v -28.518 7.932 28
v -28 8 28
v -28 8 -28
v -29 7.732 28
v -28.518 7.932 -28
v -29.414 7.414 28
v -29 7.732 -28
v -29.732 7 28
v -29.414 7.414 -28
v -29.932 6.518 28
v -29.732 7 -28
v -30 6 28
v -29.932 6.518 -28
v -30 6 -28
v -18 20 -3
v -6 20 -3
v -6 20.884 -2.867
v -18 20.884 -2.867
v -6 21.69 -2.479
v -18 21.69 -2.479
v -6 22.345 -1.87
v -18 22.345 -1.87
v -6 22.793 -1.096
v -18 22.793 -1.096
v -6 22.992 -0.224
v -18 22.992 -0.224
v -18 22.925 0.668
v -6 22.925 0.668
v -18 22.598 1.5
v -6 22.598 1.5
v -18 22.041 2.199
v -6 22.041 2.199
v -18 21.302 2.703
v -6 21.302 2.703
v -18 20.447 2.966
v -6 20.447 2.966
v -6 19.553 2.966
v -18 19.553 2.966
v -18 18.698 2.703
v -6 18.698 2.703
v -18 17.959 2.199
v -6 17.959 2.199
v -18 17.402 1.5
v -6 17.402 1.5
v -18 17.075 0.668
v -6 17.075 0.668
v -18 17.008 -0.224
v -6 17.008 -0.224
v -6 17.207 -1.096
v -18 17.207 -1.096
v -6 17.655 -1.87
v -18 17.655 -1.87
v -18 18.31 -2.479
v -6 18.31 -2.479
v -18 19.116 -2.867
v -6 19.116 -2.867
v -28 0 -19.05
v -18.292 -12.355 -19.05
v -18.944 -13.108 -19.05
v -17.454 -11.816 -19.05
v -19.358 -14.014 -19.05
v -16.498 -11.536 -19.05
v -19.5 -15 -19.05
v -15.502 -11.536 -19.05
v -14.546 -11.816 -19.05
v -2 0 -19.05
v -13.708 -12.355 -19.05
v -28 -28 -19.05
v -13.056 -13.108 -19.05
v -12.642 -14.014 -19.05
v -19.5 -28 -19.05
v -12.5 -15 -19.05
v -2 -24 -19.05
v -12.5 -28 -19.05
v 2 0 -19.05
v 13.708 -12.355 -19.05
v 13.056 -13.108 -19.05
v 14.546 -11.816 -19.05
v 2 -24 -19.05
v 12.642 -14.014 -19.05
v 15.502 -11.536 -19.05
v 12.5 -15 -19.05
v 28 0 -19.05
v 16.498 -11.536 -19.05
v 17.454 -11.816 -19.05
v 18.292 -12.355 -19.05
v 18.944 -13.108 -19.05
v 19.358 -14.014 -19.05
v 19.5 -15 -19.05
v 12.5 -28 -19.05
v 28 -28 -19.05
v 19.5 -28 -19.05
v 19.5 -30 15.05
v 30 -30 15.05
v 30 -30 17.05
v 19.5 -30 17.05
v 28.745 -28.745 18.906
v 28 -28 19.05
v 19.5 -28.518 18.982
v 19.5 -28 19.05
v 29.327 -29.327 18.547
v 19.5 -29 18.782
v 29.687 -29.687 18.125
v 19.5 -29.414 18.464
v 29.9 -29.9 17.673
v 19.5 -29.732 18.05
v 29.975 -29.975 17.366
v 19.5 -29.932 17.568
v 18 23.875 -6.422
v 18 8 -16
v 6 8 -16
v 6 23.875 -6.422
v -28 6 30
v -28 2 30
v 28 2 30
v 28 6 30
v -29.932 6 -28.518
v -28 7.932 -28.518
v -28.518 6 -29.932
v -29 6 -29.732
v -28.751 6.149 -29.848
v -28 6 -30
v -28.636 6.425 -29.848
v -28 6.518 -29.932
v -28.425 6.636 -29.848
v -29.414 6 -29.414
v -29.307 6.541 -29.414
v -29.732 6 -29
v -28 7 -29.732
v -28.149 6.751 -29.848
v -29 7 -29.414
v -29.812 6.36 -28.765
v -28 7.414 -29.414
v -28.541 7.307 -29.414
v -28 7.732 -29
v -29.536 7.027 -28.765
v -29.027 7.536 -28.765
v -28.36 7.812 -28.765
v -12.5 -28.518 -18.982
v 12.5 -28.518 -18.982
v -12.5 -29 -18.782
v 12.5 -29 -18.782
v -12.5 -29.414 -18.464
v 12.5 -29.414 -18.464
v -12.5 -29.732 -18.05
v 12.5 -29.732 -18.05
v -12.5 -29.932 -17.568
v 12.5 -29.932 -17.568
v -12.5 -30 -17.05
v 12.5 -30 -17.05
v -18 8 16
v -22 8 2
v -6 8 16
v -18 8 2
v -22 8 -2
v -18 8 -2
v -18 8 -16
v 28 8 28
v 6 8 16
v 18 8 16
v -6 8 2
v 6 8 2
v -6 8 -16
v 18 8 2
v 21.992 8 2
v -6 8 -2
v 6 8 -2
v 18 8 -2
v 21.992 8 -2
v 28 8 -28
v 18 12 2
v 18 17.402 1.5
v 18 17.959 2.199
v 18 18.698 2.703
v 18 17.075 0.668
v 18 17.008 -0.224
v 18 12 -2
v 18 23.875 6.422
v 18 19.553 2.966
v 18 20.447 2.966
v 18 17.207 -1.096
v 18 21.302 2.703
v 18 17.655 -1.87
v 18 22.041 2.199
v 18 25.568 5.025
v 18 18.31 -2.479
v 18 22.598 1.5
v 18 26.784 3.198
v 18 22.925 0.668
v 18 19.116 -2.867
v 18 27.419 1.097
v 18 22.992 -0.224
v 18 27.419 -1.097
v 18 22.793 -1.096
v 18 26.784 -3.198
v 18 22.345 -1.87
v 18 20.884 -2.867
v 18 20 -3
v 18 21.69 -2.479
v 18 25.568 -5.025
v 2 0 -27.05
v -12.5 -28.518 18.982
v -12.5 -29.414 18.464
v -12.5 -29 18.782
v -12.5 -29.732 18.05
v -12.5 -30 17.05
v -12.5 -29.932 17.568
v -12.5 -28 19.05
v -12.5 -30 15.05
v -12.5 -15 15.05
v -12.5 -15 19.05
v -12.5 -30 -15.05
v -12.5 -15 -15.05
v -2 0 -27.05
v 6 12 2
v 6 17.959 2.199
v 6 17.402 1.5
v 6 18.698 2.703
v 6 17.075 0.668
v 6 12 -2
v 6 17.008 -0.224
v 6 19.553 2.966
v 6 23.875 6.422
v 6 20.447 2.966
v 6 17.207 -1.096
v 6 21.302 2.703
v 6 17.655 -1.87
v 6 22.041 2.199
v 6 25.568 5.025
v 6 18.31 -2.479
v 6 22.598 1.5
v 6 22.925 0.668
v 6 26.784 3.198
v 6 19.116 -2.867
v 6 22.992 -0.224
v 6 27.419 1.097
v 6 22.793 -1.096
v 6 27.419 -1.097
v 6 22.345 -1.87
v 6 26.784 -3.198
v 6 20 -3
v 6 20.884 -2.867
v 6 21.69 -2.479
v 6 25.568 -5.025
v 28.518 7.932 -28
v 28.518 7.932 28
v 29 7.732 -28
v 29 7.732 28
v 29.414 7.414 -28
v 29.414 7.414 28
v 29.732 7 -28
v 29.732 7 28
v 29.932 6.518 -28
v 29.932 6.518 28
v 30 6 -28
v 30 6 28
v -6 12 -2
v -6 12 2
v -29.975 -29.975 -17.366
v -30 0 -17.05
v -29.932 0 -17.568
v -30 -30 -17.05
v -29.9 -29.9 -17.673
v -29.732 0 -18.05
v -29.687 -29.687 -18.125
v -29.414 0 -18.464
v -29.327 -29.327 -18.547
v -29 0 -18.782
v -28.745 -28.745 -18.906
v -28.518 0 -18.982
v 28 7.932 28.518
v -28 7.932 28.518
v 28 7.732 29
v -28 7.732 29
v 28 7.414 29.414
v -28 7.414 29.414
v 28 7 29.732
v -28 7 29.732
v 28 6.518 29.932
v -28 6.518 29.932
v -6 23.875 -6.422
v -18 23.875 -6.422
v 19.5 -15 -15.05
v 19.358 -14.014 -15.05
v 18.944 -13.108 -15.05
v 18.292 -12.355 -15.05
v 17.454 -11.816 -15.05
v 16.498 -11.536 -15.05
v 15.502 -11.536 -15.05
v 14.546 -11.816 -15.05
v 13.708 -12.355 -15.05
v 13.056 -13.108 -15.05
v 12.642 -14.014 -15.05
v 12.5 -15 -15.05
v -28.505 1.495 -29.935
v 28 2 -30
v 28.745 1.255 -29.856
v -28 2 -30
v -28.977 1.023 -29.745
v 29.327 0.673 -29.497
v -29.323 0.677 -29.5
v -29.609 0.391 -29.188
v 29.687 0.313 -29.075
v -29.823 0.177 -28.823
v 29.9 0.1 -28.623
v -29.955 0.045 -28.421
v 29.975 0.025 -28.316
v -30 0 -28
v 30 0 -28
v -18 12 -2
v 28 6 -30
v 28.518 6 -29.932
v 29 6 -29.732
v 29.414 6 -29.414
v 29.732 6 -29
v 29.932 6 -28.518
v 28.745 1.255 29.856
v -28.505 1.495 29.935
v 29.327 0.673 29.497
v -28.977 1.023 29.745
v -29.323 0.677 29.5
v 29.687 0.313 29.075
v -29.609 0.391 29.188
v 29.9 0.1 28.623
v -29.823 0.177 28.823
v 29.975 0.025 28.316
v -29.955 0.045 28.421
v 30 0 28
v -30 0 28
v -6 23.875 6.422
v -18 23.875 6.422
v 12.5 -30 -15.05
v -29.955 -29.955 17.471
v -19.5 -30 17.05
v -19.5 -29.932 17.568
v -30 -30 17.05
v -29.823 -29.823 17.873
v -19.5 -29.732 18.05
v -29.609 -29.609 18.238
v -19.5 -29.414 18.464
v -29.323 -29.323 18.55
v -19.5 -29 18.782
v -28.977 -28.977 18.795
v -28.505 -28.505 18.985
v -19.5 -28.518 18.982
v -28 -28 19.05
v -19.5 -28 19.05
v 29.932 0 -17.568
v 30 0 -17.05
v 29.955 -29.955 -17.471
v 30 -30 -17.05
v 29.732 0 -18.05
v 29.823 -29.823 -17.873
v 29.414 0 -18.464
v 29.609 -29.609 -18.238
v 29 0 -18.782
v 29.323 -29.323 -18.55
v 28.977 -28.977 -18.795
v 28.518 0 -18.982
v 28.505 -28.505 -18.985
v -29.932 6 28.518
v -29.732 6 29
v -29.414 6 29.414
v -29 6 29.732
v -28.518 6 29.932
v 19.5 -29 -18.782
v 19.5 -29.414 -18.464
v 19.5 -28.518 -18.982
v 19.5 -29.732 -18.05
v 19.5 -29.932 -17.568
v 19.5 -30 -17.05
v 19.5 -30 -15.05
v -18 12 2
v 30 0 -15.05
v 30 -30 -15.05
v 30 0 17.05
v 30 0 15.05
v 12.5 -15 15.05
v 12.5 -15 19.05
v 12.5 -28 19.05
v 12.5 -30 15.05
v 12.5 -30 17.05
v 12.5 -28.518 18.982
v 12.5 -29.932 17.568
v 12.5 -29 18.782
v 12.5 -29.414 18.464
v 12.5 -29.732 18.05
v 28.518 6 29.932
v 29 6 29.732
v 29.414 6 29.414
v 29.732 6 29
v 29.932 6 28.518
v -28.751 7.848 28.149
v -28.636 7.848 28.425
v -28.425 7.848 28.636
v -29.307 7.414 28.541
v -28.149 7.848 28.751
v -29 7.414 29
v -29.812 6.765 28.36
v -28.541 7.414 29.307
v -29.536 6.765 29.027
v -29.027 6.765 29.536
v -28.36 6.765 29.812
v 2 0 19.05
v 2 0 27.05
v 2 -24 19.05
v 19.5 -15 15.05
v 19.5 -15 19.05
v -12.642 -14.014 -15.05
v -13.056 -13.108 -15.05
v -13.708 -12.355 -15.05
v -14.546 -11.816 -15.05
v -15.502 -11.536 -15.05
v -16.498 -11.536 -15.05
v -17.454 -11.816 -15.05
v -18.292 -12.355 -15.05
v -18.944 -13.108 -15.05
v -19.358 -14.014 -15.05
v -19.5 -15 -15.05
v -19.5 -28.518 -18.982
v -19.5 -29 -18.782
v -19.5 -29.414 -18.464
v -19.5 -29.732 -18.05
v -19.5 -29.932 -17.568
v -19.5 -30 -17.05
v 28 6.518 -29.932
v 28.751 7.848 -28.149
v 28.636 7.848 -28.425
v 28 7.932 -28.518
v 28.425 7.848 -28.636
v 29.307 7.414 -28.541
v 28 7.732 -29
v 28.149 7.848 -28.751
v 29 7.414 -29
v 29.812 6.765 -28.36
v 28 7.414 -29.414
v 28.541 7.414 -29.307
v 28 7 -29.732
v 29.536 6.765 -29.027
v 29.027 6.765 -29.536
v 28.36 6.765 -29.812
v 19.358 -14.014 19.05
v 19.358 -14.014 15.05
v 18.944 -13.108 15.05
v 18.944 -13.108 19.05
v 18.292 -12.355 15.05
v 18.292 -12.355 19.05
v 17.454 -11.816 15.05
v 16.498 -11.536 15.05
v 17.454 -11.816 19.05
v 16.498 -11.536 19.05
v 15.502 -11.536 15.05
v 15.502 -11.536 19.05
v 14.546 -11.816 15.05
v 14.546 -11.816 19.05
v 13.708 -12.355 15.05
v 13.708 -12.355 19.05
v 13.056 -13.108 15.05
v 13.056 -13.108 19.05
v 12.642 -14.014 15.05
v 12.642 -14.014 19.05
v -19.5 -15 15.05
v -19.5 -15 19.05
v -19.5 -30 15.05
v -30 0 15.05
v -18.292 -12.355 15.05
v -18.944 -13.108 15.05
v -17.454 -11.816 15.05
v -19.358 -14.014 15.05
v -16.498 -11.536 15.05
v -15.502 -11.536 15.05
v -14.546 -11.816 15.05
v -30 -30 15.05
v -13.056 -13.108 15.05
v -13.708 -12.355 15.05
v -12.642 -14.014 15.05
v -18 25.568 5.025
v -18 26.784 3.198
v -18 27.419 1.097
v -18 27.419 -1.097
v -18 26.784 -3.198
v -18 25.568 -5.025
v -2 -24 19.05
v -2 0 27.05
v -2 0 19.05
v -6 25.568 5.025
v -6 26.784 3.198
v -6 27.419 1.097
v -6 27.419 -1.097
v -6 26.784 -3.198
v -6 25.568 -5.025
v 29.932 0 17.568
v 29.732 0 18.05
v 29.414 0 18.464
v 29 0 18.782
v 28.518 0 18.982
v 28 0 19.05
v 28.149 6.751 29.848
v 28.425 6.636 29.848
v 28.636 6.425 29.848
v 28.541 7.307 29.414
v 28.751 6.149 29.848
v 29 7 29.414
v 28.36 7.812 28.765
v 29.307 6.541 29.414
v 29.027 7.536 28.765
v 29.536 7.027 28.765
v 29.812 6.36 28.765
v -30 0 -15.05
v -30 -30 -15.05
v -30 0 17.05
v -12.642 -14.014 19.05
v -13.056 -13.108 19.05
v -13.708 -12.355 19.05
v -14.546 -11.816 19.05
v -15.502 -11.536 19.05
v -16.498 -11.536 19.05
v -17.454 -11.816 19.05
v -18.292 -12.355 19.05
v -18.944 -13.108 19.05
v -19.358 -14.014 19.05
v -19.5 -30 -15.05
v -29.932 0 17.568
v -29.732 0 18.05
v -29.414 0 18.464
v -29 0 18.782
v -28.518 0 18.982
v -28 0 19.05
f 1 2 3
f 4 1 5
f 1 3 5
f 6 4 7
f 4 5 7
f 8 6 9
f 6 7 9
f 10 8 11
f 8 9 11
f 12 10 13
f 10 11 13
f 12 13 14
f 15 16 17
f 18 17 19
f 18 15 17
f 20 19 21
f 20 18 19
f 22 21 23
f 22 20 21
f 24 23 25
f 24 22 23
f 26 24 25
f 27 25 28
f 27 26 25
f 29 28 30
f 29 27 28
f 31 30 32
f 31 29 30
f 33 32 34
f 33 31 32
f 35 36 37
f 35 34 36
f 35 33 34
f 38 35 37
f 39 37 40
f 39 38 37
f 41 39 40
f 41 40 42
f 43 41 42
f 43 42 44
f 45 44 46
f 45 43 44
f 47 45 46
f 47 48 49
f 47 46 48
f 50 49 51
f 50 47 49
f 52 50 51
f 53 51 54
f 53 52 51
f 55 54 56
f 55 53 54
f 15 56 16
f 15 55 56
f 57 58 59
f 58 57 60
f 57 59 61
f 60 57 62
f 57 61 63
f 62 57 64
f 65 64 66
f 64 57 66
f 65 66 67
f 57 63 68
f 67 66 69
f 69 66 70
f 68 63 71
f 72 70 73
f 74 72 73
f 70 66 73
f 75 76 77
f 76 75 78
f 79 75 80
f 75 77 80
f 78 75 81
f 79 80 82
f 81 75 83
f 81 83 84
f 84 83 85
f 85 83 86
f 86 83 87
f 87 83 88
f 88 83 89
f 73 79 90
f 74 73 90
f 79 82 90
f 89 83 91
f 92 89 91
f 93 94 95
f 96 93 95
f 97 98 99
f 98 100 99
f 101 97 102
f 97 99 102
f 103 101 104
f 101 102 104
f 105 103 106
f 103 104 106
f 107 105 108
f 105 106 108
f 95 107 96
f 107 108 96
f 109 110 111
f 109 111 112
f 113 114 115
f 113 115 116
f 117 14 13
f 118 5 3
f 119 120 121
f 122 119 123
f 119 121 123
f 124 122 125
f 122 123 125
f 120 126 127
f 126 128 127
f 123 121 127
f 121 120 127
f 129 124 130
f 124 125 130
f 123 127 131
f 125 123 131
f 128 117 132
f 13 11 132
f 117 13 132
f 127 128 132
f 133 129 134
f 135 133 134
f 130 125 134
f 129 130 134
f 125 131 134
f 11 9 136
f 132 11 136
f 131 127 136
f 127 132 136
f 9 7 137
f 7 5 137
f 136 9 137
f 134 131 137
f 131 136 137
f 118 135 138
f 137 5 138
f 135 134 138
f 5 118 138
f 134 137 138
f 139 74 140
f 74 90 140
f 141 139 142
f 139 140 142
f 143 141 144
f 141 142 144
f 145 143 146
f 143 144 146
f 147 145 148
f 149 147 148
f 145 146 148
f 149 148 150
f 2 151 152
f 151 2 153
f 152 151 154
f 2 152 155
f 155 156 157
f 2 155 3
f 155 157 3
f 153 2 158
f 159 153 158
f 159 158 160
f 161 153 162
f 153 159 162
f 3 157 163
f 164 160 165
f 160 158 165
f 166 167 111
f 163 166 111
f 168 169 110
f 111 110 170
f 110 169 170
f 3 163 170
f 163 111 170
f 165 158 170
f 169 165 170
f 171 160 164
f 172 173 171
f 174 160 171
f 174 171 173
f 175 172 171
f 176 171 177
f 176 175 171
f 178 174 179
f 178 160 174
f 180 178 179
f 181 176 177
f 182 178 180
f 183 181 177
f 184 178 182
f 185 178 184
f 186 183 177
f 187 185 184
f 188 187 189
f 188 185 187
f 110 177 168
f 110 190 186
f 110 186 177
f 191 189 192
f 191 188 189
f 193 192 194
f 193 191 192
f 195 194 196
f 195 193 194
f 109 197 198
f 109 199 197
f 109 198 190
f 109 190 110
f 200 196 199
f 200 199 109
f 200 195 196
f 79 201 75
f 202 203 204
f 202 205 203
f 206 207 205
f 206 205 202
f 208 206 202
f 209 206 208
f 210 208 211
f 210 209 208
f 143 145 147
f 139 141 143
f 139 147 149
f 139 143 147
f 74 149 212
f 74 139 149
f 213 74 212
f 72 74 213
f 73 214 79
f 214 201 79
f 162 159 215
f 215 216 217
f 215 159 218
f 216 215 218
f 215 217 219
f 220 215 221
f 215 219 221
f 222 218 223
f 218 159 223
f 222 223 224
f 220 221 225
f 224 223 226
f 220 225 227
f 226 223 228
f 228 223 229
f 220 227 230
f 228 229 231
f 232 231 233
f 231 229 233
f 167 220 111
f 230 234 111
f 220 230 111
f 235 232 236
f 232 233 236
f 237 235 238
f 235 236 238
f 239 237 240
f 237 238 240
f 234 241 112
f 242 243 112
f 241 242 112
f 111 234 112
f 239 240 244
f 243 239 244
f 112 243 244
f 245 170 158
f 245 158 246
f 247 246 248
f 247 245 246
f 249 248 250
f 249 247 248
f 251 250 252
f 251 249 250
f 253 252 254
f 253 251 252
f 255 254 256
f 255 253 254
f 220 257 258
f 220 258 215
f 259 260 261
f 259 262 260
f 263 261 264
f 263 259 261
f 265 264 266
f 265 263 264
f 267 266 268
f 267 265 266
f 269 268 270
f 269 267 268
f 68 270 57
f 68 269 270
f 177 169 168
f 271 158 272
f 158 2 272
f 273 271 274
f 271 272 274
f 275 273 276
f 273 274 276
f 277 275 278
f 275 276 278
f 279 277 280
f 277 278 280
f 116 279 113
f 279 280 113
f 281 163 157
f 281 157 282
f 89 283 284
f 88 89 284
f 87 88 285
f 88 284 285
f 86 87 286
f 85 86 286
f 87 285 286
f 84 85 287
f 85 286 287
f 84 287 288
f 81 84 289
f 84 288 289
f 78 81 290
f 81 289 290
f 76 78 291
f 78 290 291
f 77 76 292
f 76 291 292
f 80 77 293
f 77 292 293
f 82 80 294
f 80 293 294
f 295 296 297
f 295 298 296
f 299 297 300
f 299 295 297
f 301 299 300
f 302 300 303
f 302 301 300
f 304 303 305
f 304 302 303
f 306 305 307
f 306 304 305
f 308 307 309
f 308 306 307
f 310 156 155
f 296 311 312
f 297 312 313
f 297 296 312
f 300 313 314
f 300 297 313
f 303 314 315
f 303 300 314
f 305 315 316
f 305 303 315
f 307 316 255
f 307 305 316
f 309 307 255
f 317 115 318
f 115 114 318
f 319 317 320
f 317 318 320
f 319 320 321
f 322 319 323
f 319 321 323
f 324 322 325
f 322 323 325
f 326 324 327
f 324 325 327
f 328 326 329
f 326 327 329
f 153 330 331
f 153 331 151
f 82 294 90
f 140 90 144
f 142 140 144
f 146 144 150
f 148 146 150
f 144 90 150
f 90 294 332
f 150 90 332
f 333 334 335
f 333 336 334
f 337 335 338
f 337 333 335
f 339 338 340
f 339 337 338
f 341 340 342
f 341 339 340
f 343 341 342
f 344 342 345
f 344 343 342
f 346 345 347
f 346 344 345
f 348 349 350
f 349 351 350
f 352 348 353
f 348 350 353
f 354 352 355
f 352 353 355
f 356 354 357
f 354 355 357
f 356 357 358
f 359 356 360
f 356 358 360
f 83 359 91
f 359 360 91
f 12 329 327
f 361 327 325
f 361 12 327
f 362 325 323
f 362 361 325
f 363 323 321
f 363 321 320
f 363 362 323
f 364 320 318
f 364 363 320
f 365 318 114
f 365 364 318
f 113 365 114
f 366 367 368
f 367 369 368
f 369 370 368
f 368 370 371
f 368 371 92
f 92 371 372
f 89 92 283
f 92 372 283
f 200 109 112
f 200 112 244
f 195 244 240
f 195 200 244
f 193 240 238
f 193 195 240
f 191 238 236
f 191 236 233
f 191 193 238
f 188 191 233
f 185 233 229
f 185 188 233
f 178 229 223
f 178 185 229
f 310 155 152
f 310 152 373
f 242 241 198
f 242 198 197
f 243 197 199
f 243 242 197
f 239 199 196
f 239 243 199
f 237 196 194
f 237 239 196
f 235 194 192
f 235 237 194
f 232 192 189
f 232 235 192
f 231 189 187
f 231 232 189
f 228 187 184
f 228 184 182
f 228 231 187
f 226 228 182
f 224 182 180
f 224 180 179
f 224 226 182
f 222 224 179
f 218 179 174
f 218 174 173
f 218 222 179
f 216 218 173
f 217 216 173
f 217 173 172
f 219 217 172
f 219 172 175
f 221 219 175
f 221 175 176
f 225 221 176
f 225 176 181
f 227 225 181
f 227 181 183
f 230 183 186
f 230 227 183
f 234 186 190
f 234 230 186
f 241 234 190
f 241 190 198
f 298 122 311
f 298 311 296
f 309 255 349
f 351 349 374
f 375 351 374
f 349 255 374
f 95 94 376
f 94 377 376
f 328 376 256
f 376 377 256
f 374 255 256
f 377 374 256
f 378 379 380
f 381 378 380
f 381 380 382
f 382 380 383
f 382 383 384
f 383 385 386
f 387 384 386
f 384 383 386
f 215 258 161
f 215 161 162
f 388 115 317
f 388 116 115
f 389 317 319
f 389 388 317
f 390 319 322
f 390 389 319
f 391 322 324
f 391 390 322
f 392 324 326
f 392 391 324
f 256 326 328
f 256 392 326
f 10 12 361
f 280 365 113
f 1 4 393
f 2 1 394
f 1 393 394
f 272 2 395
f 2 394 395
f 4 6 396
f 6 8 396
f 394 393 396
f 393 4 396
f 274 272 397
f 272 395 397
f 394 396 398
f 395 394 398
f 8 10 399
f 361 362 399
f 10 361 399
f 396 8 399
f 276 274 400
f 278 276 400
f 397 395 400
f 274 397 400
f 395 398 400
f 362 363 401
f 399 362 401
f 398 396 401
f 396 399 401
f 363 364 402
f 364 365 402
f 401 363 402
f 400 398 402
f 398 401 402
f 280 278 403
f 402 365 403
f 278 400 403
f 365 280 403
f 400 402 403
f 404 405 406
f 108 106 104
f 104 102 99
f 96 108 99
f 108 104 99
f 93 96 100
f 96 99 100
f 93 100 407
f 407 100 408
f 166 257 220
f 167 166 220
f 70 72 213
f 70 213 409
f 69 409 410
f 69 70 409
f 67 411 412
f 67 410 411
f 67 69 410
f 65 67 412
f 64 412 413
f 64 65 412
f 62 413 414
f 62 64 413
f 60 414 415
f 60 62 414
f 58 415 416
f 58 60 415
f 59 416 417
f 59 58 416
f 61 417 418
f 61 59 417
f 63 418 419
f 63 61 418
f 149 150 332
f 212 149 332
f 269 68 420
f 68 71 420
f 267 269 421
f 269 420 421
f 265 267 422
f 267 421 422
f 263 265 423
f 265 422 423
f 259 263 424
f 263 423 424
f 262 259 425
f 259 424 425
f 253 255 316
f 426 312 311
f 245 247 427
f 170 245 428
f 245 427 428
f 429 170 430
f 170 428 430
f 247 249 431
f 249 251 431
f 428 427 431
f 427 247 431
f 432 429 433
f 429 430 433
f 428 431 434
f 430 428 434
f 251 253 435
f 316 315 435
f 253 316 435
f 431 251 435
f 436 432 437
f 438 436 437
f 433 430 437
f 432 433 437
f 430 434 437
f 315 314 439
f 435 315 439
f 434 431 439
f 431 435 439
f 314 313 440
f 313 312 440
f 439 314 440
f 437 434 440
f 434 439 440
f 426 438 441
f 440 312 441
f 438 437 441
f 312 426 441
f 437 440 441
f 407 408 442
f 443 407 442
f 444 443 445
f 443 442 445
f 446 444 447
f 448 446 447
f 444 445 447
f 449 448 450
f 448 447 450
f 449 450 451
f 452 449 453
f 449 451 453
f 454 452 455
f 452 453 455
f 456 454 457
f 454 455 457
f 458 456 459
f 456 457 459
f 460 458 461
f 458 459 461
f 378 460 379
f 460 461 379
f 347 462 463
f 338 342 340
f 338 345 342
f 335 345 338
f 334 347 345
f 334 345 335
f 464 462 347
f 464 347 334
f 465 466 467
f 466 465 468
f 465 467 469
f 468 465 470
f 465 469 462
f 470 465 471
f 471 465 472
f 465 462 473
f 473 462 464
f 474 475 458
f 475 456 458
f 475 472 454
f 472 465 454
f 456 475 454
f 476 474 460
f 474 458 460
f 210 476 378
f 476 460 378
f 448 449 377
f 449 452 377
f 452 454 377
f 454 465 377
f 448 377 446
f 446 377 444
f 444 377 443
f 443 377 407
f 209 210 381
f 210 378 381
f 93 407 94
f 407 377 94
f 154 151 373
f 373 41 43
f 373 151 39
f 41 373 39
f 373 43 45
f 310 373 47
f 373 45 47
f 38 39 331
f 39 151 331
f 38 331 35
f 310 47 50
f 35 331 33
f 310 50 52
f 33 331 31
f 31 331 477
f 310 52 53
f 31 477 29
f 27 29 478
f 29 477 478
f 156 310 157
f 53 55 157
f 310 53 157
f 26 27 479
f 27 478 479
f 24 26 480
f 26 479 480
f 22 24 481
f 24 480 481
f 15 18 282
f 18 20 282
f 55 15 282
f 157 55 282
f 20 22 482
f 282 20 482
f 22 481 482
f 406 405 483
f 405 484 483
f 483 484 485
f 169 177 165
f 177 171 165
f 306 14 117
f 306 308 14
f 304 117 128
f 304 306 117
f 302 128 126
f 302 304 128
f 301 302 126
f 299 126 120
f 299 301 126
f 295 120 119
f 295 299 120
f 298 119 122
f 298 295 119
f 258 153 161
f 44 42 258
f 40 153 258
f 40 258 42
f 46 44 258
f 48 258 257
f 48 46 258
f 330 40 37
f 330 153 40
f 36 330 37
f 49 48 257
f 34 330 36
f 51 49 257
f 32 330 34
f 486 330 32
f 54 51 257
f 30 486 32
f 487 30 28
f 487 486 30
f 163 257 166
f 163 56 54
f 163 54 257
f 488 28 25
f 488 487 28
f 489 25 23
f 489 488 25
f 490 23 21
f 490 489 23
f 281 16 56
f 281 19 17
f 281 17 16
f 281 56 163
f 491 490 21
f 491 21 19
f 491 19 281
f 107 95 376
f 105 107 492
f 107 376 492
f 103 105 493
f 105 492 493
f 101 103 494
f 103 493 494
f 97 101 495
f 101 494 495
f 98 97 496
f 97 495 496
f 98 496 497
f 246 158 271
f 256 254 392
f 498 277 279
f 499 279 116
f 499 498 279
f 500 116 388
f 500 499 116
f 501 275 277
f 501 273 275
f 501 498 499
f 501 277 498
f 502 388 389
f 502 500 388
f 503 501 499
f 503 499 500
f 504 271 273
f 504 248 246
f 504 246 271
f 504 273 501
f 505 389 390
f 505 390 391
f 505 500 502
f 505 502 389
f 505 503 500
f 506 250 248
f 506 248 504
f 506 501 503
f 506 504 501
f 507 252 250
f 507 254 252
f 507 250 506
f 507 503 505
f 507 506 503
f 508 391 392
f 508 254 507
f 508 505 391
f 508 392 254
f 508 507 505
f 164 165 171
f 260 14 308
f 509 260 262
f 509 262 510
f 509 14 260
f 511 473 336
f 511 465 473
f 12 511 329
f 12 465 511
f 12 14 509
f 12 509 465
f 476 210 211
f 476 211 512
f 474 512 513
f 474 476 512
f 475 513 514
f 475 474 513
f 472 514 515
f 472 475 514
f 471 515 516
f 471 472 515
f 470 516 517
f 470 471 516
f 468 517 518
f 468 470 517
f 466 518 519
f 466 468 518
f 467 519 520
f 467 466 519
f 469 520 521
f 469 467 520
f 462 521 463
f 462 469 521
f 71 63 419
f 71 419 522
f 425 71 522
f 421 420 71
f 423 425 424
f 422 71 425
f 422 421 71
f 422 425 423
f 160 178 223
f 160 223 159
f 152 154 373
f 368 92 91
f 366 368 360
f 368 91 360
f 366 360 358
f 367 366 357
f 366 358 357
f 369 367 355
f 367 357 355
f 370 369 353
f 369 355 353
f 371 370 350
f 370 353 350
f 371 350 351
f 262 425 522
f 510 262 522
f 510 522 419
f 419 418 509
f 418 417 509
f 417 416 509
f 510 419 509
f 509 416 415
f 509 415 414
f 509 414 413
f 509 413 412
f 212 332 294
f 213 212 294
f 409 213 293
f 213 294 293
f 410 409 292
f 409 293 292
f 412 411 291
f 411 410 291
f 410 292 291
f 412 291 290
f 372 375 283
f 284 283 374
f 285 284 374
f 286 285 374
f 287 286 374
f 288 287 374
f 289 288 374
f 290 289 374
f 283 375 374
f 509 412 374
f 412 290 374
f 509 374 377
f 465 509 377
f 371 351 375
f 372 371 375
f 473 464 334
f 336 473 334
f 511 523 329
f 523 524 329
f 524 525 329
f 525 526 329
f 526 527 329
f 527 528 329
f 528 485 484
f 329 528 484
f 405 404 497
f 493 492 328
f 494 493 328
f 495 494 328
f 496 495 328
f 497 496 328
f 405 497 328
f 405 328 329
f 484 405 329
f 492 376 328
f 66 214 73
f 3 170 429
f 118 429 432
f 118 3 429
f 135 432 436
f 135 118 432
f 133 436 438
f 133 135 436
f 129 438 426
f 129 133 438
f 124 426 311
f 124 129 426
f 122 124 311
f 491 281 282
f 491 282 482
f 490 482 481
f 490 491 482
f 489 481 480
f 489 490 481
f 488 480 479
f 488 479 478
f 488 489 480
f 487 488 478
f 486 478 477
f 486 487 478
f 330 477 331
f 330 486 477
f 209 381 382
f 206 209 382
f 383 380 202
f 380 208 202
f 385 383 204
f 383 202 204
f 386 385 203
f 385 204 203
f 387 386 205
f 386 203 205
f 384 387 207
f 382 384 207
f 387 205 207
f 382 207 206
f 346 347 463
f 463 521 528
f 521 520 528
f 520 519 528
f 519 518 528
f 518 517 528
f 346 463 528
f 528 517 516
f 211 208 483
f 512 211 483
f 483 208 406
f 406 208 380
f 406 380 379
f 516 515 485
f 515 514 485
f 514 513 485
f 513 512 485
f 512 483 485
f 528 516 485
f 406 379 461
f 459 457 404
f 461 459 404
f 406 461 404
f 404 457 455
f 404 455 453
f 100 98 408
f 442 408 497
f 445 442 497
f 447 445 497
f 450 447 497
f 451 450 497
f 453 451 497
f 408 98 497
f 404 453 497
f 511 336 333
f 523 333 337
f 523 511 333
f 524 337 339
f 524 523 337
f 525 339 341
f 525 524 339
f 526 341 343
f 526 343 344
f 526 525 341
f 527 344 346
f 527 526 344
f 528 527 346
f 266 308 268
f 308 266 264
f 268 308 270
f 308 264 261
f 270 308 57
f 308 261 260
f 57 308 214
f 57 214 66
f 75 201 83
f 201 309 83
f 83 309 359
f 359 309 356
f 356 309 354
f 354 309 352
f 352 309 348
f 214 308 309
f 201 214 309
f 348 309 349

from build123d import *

# Parameters (mm, degrees)
EXTRUDE_1_DEPTH     = 30
EXTRUDE_2_DEPTH     = 2
SKETCH_4_R          = 3
EXTRUDE_3_DEPTH     = 18
CUT_EXTRUDE_1_DEPTH = 6
SKETCH_6_W          = 12
SKETCH_6_H          = 4
EXTRUDE_4_DEPTH     = 2
CUT_EXTRUDE_2_DEPTH = 22
FILLET_1_R          = 2


with BuildPart() as part:
    # 스케치2 → 보스-돌출1 (new, symmetric)
    with BuildSketch(Plane(origin=(0, 0, 0), x_dir=(0, 0, -1), z_dir=(1, 0, 0))):
        Polygon((15.05, 0), (-15.05, 0), (-15.05, -30), (-19.05, -30), (-19.05, 0), (-30, 0), (-30, 8), (30, 8), (30, 0), (19.05, 0), (19.05, -30), (15.05, -30), align=None)
    extrude(amount=EXTRUDE_1_DEPTH, both=True)

    # 스케치3 → 보스-돌출2 (add, symmetric)
    with BuildSketch(Plane(origin=(0, 0, 0), x_dir=(0, 0, -1), z_dir=(1, 0, 0))):
        Polygon((-19.05, 0), (-27.05, 0), (-19.05, -24), align=None)
        Polygon((19.05, 0), (27.05, 0), (19.05, -24), align=None)
    extrude(amount=EXTRUDE_2_DEPTH, both=True)

    # 스케치4 → 보스-돌출3 (add, symmetric)
    with BuildSketch(Plane(origin=(0, 0, 0), x_dir=(0, 0, -1), z_dir=(1, 0, 0))):
        with BuildLine():
            Line((-6.421611649, 23.874648865), (-16, 8))
            Line((-16, 8), (16, 8))
            Line((16, 8), (6.421611649, 23.874648865))
            ThreePointArc((6.421611649, 23.874648865), (0, 27.5), (-6.421611649, 23.874648865))
        make_face()
        with Locations((0, 20)):
            Circle(SKETCH_4_R, mode=Mode.SUBTRACT)
    extrude(amount=EXTRUDE_3_DEPTH, both=True)

    # 스케치5 → 컷-돌출1 (cut, symmetric)
    with BuildSketch(Plane(origin=(0, 0, 0), x_dir=(0, 0, -1), z_dir=(1, 0, 0))):
        with BuildLine():
            Line((-6.421611649, 23.874648865), (-16, 8))
            Line((-16, 8), (16, 8))
            Line((16, 8), (6.421611649, 23.874648865))
            ThreePointArc((6.421611649, 23.874648865), (0, 27.5), (-6.421611649, 23.874648865))
        make_face()
    extrude(amount=CUT_EXTRUDE_1_DEPTH, both=True, mode=Mode.SUBTRACT)

    # 스케치6 → 보스-돌출4 (add, symmetric)
    with BuildSketch(Plane.XY):
        Polygon((-18, 8), (-22, 8), (-18, 12), align=None)
        with Locations((0, 10)):
            Rectangle(SKETCH_6_W, SKETCH_6_H)
        Polygon((17.991556012, 8), (18, 12), (21.991556012, 8), align=None)
    extrude(amount=EXTRUDE_4_DEPTH, both=True)

    # 스케치7 → 컷-돌출2 (cut, symmetric)
    with BuildSketch(Plane.XY):
        with BuildLine():
            Line((-19.5, -15), (-19.5, -30))
            Line((-19.5, -30), (-12.5, -30))
            Line((-12.5, -30), (-12.5, -15))
            ThreePointArc((-12.5, -15), (-16, -11.5), (-19.5, -15))
        make_face()
        with BuildLine():
            Line((12.5, -15), (12.5, -30))
            Line((12.5, -30), (19.5, -30))
            Line((19.5, -30), (19.5, -15))
            ThreePointArc((19.5, -15), (16, -11.5), (12.5, -15))
        make_face()
    extrude(amount=CUT_EXTRUDE_2_DEPTH, both=True, mode=Mode.SUBTRACT)

    # 필렛1
    fillet_1_edges = [part.edges().sort_by_distance(p)[0] for p in [
        (30, -15, -19.05),
        (-30, -15, 19.05),
        (-30, 4, 30),
        (-30, 8, 0),
        (0, -30, 19.05),
        (-24.75, -30, 19.05),
        (-30, 4, -30),
        (0, -30, -19.05),
        (-24.75, -30, -19.05),
        (-30, -15, -19.05),
        (30, 4, -30),
        (30, 8, 0),
        (24.75, -30, 19.05),
        (0, 0, 30),
        (0, 8, 30),
        (0, 8, -30),
        (0, 0, -30),
        (24.75, -30, -19.05),
        (30, 4, 30),
        (30, -15, 19.05),
    ]]
    fillet(fillet_1_edges, radius=FILLET_1_R)


solid = part.part
